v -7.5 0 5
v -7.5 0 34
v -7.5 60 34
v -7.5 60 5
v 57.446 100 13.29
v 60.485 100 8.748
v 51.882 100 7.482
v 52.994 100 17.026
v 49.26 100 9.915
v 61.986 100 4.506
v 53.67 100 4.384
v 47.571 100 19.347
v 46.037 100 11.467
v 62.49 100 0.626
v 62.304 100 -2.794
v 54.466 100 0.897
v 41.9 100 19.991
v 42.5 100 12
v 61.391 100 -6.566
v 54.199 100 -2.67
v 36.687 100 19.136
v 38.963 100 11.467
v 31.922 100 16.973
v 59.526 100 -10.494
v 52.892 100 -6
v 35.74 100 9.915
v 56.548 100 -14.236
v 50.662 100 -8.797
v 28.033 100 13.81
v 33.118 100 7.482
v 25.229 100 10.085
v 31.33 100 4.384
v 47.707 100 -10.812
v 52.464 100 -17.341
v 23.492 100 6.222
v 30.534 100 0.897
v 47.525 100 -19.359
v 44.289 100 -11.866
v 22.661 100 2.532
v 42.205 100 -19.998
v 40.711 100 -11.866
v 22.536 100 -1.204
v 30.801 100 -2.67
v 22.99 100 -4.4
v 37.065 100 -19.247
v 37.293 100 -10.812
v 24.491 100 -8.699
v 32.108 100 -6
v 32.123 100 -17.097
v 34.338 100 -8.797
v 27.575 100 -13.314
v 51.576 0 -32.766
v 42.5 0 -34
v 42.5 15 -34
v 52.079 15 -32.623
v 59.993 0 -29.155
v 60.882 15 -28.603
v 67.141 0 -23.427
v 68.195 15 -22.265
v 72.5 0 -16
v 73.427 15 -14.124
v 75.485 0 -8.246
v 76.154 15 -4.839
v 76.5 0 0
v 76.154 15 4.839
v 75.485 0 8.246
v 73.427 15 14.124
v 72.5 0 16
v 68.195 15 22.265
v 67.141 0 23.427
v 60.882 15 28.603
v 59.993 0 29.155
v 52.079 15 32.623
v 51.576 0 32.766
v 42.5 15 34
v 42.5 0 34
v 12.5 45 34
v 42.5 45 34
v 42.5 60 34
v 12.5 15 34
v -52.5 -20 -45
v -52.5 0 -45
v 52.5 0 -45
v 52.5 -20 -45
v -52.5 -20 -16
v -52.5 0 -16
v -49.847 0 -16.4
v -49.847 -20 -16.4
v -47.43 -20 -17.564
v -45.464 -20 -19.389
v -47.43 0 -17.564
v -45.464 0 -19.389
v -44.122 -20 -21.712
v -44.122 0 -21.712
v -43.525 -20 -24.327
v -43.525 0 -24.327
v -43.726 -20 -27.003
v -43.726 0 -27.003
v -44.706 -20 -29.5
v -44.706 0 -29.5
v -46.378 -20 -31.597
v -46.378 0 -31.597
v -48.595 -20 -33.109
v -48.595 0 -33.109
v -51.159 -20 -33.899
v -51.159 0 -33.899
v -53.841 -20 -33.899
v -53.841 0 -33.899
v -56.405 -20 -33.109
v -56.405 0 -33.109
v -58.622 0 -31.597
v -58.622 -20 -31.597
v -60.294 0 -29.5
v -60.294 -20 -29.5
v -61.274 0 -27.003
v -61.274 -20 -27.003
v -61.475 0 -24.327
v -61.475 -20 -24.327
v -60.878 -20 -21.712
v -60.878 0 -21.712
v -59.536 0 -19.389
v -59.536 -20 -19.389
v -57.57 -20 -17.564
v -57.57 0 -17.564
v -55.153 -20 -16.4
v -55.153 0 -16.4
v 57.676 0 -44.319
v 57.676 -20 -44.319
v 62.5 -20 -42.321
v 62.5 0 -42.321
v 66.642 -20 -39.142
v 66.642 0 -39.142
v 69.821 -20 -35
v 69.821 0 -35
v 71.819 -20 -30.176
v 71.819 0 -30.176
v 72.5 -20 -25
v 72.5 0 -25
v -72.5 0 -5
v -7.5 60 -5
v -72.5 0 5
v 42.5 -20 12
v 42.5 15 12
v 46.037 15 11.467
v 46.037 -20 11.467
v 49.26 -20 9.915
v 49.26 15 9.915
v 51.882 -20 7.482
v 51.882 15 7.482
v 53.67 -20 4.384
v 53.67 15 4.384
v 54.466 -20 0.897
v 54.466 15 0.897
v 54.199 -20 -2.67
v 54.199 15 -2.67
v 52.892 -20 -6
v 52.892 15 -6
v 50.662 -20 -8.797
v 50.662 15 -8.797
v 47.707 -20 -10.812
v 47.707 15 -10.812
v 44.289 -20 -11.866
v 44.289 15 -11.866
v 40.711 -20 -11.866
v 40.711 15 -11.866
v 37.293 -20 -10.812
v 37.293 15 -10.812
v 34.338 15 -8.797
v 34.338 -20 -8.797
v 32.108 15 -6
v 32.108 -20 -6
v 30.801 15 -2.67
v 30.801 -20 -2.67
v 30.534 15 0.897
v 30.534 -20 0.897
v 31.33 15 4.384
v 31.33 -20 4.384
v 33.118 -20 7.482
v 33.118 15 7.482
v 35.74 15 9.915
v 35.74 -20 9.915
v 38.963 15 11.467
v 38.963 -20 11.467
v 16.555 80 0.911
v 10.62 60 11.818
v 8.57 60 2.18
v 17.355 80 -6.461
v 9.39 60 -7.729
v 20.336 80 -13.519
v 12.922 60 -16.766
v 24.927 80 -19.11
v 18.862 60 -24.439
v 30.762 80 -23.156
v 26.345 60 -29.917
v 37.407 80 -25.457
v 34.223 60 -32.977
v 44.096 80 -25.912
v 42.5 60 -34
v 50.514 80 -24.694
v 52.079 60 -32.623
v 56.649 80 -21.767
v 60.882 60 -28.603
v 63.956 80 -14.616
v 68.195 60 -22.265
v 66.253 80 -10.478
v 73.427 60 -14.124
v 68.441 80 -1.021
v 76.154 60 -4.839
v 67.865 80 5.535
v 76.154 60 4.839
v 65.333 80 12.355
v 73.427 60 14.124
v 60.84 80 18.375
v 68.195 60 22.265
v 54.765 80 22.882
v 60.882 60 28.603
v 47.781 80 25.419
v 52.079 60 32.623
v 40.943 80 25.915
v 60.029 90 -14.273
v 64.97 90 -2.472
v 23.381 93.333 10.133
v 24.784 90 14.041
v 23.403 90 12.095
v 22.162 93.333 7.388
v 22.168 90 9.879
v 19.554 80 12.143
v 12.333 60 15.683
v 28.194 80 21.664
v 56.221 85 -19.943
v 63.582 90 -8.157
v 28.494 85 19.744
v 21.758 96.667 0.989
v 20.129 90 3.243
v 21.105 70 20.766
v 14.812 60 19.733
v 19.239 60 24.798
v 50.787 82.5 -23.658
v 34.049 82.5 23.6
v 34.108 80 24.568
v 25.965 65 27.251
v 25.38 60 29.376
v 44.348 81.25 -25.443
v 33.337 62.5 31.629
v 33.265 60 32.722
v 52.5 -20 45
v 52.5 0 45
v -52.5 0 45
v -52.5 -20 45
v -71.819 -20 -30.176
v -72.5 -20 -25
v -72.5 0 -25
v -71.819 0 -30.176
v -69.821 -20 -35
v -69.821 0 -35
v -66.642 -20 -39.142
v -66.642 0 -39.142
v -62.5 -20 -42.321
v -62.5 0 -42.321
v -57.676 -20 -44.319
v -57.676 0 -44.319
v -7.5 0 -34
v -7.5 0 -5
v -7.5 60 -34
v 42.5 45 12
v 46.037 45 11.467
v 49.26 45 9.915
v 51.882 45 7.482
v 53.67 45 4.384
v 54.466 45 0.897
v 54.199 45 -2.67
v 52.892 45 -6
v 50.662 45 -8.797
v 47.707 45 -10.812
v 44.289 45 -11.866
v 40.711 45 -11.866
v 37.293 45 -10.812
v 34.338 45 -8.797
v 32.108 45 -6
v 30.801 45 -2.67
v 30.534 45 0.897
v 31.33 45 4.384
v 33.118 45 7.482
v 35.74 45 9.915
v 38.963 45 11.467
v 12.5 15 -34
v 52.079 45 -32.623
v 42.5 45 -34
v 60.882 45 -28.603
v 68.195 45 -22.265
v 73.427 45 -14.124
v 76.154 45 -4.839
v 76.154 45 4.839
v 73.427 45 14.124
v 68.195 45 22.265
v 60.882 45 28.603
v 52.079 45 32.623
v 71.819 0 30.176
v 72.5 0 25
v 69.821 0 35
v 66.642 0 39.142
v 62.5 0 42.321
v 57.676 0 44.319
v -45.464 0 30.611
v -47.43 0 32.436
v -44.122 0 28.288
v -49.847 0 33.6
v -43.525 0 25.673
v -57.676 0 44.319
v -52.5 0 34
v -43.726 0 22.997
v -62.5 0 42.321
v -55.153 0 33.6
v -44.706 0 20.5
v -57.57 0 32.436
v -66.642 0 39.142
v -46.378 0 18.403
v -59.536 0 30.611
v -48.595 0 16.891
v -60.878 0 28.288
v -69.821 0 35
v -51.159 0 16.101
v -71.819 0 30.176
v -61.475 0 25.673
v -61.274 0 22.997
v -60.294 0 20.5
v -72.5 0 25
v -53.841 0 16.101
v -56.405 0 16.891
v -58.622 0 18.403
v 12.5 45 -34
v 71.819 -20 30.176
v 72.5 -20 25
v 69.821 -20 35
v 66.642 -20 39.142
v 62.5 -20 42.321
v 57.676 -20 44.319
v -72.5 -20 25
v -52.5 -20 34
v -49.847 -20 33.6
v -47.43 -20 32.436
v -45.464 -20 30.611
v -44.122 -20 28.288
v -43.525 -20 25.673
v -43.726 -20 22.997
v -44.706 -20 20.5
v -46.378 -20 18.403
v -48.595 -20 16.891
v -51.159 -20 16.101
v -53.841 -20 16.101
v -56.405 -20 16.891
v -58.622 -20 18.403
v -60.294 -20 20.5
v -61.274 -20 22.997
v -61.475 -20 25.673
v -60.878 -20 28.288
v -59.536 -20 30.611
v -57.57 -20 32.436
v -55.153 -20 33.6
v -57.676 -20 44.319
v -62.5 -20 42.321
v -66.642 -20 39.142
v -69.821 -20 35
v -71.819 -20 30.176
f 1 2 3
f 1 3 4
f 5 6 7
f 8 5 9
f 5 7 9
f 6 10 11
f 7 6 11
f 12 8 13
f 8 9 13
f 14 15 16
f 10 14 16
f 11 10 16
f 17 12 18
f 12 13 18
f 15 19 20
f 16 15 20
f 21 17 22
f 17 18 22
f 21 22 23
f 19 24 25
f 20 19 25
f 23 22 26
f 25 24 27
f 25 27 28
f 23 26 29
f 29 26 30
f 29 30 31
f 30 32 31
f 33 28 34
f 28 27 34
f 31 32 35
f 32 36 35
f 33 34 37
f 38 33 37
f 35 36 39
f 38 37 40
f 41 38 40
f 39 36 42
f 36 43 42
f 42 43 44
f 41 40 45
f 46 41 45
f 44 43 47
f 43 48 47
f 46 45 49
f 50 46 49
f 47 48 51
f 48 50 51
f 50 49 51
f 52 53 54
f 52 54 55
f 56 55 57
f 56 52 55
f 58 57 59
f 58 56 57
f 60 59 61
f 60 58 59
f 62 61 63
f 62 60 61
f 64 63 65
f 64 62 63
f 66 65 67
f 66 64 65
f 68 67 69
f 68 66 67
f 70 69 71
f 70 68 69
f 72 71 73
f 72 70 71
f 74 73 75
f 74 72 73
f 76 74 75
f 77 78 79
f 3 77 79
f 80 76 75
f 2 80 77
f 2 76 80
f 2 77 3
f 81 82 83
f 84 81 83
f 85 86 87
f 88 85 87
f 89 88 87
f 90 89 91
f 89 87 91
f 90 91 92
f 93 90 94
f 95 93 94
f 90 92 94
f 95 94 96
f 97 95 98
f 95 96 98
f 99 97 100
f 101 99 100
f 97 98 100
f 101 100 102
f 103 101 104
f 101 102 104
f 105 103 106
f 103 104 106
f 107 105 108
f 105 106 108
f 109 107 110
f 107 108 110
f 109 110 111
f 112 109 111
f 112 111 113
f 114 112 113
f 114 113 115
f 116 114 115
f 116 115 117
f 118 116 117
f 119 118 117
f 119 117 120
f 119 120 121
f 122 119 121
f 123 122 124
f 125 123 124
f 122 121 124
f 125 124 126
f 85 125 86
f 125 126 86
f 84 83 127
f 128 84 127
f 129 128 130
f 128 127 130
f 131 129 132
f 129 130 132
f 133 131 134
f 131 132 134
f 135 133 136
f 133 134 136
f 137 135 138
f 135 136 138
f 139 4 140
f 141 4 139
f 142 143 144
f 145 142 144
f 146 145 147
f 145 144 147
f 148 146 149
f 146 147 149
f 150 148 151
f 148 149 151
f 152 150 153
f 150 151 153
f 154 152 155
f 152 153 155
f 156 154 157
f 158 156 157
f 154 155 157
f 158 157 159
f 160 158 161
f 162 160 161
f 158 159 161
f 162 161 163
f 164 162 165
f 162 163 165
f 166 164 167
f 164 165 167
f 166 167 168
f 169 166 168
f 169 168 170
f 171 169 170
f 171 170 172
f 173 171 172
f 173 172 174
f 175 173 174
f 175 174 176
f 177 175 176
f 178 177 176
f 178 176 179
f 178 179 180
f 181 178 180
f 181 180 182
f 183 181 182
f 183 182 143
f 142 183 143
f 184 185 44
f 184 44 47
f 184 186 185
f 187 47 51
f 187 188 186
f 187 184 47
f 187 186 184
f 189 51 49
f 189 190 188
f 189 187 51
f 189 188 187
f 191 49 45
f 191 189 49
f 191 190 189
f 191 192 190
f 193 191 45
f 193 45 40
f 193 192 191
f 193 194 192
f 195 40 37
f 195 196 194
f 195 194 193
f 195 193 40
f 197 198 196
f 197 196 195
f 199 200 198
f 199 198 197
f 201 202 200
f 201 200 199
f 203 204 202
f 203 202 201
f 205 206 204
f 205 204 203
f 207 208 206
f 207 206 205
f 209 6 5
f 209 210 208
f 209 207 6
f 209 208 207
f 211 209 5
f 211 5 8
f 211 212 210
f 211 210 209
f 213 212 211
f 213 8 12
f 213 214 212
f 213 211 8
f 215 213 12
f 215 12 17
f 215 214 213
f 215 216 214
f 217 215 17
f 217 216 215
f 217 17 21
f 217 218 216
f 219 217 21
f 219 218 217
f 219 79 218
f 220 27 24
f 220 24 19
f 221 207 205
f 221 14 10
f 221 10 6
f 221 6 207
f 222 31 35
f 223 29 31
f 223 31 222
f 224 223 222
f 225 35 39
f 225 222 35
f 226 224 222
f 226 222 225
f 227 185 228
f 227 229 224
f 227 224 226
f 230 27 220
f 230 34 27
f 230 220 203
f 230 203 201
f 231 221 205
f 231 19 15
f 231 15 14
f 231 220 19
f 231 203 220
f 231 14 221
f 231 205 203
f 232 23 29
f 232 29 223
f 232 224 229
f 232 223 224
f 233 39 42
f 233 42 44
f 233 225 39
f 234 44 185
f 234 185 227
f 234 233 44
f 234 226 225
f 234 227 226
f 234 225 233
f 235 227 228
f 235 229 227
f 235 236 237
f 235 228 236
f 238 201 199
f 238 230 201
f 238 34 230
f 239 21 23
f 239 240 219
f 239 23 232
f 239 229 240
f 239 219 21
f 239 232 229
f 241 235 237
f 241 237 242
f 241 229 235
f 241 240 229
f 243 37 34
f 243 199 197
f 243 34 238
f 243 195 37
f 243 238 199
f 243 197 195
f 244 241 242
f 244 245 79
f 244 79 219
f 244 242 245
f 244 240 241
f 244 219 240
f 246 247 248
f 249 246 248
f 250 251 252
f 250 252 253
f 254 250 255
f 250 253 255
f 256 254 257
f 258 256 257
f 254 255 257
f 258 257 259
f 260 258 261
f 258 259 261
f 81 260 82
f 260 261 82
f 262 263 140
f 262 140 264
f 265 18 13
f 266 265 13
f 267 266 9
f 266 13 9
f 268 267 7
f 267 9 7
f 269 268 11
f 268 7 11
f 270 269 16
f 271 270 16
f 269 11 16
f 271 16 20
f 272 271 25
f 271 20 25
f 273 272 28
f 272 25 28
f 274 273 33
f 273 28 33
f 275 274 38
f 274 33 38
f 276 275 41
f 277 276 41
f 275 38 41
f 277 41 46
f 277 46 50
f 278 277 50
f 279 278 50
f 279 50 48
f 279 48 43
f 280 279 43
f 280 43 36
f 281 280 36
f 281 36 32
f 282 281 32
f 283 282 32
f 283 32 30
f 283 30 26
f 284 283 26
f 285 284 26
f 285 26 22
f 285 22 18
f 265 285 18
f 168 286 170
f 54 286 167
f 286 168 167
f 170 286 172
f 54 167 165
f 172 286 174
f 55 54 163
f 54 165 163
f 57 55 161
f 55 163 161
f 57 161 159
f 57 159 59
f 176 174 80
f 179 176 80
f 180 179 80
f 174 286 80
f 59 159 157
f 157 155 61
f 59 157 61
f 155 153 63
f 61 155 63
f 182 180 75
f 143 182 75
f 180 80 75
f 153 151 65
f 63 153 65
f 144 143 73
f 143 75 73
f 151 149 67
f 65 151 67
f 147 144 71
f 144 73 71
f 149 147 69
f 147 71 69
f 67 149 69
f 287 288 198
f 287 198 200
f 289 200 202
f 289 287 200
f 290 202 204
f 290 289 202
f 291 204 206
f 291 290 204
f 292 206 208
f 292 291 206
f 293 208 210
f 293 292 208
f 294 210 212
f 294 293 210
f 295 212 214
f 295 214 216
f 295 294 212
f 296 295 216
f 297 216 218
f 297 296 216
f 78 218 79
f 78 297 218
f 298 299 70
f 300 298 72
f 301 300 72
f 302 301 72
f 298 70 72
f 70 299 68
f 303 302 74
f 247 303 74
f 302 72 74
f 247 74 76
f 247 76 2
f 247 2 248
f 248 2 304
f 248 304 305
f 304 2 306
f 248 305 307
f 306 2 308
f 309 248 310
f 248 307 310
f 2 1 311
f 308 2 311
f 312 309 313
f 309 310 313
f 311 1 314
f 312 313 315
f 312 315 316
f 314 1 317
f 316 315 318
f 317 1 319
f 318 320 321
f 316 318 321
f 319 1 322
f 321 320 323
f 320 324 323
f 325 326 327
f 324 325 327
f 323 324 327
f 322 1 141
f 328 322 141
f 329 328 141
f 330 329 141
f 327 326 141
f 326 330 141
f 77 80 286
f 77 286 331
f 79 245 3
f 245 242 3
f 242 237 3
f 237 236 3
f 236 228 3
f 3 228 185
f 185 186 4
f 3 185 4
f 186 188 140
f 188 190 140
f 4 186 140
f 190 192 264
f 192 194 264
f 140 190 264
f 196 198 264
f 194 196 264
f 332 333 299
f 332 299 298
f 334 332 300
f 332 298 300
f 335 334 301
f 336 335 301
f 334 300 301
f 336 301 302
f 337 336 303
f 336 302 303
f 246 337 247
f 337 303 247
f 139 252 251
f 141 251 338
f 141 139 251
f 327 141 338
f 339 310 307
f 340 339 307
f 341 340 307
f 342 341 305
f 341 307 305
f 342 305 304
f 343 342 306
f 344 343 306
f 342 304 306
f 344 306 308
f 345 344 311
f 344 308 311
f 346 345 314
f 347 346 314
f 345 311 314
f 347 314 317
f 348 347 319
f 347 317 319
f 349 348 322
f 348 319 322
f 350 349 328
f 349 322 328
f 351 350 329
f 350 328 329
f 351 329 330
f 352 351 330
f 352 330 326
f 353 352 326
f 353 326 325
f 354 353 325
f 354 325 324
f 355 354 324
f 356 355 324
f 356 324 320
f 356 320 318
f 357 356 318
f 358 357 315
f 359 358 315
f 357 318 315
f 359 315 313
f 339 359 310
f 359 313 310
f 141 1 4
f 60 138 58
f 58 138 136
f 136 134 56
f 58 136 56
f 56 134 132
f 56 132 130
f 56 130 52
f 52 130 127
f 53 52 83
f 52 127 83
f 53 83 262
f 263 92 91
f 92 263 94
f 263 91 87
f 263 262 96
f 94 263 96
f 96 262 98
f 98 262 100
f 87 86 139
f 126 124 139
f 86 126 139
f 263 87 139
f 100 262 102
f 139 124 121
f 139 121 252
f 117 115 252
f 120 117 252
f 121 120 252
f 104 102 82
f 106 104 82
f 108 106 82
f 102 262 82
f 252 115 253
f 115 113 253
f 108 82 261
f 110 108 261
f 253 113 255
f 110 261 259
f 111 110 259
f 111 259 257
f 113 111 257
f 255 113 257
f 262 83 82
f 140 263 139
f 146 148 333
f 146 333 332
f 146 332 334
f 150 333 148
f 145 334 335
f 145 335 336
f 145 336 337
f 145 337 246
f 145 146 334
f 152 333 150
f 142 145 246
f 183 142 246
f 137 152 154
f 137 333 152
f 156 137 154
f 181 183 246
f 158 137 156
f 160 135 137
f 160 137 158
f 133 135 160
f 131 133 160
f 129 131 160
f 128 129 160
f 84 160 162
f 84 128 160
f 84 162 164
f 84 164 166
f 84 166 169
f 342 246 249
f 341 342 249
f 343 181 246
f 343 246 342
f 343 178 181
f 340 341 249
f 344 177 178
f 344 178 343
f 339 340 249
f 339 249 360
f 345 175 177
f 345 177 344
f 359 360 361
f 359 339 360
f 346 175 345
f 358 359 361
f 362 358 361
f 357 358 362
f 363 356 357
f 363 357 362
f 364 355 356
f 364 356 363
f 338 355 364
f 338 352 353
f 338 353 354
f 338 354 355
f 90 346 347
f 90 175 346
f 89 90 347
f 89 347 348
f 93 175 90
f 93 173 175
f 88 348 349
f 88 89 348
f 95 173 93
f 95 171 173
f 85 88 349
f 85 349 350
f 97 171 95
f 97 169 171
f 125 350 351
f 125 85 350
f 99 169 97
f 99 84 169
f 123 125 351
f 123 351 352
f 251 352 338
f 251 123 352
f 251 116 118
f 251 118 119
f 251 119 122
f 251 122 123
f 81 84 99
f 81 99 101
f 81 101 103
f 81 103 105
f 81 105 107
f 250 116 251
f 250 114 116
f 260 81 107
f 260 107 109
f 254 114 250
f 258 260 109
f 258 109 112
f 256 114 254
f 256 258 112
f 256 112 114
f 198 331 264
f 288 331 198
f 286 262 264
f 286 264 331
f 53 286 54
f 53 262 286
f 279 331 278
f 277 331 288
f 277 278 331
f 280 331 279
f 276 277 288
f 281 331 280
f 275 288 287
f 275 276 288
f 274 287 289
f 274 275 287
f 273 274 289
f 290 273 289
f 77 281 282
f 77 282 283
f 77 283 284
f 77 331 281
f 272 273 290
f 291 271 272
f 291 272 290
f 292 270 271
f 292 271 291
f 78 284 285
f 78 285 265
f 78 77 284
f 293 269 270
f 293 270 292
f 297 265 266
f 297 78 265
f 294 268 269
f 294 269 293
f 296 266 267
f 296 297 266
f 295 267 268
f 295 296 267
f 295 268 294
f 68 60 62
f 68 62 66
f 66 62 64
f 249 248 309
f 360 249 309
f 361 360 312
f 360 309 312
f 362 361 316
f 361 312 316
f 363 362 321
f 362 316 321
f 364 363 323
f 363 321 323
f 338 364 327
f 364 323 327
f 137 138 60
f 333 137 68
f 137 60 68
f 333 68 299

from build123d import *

# Parameters (mm, degrees)
SKETCH1_R           = 9
BOSS_EXTRUDE1_DEPTH = 20
BOSS_EXTRUDE2_DEPTH = 60
SKETCH7_R           = 12
CUT_EXTRUDE1_DEPTH  = 150.255653211
SKETCH8_W           = 103.314171972
SKETCH8_H           = 30
CUT_EXTRUDE2_DEPTH  = 149.637983151
SKETCH10_W          = 10
SKETCH10_H          = 60
BOSS_EXTRUDE3_DEPTH = 65
CUT_EXTRUDE3_DEPTH  = 136.470476619


with BuildPart() as part:
    # Sketch1 → Boss-Extrude1 (new body)
    with BuildSketch(Plane(origin=(0, 0, 0), x_dir=(1, 0, 0), z_dir=(0, 1, 0))):
        with BuildLine():
            Line((-52.5, 45), (52.5, 45))
            ThreePointArc((52.5, 45), (66.642135624, 39.142135624), (72.5, 25))
            Line((72.5, 25), (72.5, -25))
            ThreePointArc((72.5, -25), (66.642135624, -39.142135624), (52.5, -45))
            Line((52.5, -45), (-52.5, -45))
            ThreePointArc((-52.5, -45), (-66.642135624, -39.142135624), (-72.5, -25))
            Line((-72.5, -25), (-72.5, 25))
            ThreePointArc((-72.5, 25), (-66.642135624, 39.142135624), (-52.5, 45))
        make_face()
        with Locations(Location((-52.5, 25, 0), (0, 0, 270))):
            Circle(SKETCH1_R, mode=Mode.SUBTRACT)
        with Locations(Location((-52.5, -25, 0), (0, 0, 270))):
            Circle(SKETCH1_R, mode=Mode.SUBTRACT)
    extrude(amount=-BOSS_EXTRUDE1_DEPTH)

    # Sketch2 → Boss-Extrude2 (add)
    with BuildSketch(Plane(origin=(0, 0, 0), x_dir=(1, 0, 0), z_dir=(0, 1, 0))):
        with BuildLine():
            Line((-7.5, 34), (42.5, 34))
            ThreePointArc((42.5, 34), (76.5, 0), (42.5, -34))
            Line((42.5, -34), (-7.5, -34))
            Line((-7.5, -34), (-7.5, 34))
        make_face()
    extrude(amount=BOSS_EXTRUDE2_DEPTH)

    # Loft1: read off the stored shape, not the designer's step
    # Loft1: loft between two sections, ruled curve by curve
    loft1_from = [
        Edge.make_bspline([(22.989923238, 100, -4.399648251), (31.789219739, 100, -43.419801775), (70.809373263, 100, -34.620505274), (62.010076762, 100, 4.399648251), (53.210780261, 100, 43.419801775), (14.190626737, 100, 34.620505274), (22.989923238, 100, -4.399648251)], [0, 0, 0, 0, 0.5, 0.5, 0.5, 1, 1, 1, 1], 3, [1, 0.333333333, 0.333333333, 1, 0.333333333, 0.333333333, 1]),
    ]
    loft1_to = [
        Edge.make_bspline([(10.620019024, 60, 11.818071457), (-13.01612389, 60, -51.941890495), (50.743838062, 60, -75.578033409), (74.379980976, 60, -11.818071457), (98.01612389, 60, 51.941890495), (34.256161938, 60, 75.578033409), (10.620019024, 60, 11.818071457)], [0, 0, 0, 0, 0.5, 0.5, 0.5, 1, 1, 1, 1], 3, [1, 0.333333333, 0.333333333, 1, 0.333333333, 0.333333333, 1]),
    ]
    loft1 = Solid(Shell([*[Face.make_surface_from_curves(loft1_from[k], loft1_to[k]) for k in range(1)], Face(Wire(loft1_from)), Face(Wire(loft1_to))]))
    add(loft1)

    # Sketch7 → Cut-Extrude1 (cut, through all)
    with BuildSketch(Plane(origin=(0, 100, 0), x_dir=(1, 0, 0), z_dir=(0, 1, 0))):
        with Locations(Location((42.5, 0, 0), (0, 0, 270))):
            Circle(SKETCH7_R)
    extrude(amount=-CUT_EXTRUDE1_DEPTH, mode=Mode.SUBTRACT)

    # Sketch8 → Cut-Extrude2 (cut, through all)
    with BuildSketch(Plane.XY.offset(34)):
        with Locations((64.157085986, 30)):
            Rectangle(SKETCH8_W, SKETCH8_H)
    extrude(amount=-CUT_EXTRUDE2_DEPTH, mode=Mode.SUBTRACT)

    # Sketch10 → Boss-Extrude3 (add, through all)
    with BuildSketch(Plane.ZY.offset(7.5)):
        with Locations((0, 30)):
            Rectangle(SKETCH10_W, SKETCH10_H)
    extrude(amount=BOSS_EXTRUDE3_DEPTH)

    # Sketch11 → Cut-Extrude3 (cut, through all)
    with BuildSketch(Plane.XY.offset(5)):
        Polygon((-7.5, 60), (-72.5, 0), (-72.5, 60), align=None)
    extrude(amount=-CUT_EXTRUDE3_DEPTH, mode=Mode.SUBTRACT)


solid = part.part
